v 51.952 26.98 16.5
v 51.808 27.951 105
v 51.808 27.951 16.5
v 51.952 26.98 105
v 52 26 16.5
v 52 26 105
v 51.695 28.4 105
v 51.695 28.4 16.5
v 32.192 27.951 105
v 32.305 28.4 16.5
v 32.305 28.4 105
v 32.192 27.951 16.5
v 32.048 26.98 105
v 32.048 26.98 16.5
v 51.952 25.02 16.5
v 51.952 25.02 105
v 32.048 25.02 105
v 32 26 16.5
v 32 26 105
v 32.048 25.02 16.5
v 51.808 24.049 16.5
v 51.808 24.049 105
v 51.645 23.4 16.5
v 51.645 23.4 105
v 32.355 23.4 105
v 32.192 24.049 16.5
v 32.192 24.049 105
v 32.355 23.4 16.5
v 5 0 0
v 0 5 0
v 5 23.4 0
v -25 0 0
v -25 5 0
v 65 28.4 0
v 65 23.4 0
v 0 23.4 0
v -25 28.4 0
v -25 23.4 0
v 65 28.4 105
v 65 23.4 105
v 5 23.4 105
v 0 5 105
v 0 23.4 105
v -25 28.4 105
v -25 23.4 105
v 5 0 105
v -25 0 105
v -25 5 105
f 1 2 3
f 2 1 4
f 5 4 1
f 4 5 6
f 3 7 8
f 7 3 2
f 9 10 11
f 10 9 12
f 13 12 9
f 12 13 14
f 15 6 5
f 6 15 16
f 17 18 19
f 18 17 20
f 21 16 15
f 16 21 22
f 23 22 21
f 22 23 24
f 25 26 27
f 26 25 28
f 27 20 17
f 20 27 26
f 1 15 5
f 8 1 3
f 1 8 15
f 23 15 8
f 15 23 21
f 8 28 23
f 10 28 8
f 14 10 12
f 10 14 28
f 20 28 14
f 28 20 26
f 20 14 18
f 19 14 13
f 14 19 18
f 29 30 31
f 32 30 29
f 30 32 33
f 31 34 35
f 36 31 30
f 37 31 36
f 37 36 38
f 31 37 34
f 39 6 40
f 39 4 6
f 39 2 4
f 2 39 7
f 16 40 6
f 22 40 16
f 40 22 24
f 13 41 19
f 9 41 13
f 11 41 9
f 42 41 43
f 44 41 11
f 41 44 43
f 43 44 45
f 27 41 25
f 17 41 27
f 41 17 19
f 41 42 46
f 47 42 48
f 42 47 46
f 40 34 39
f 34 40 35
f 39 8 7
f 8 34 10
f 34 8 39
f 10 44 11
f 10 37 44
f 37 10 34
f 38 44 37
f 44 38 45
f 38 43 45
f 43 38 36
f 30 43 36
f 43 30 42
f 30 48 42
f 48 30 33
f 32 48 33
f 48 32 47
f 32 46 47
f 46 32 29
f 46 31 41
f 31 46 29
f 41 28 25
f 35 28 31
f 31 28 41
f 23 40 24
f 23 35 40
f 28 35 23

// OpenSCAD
// ---------------------------------------------------------------------------
// 3-pipette shelf clamp, printed on its side.
// Print orientation: 2-D profile in XY, extruded 105 mm along Z.
// In use: +Y is up, +X points away from the shelf, Z is the 105 mm length.
// ---------------------------------------------------------------------------

// --- named dimensions (mm) ---
shelf_t      = 18;    // shelf thickness the clamp grips
gap          = 18.4;  // vertical gap left for the shelf (bottom jaw top -> top jaw bottom)
spine_x0     = 0;     // spine starts at x = 0
spine_x1     = 5;     // spine ends at x = 5
spine_y0     = 0;     // spine bottom edge (shelf face)
spine_y1     = 28.4;  // spine top edge
bot_x0       = -25;   // bottom jaw starts at x = -25
bot_x1       = 5;     // bottom jaw ends at x = 5
bot_y0       = 0;     // bottom jaw bottom edge
bot_y1       = 5;     // bottom jaw top edge
top_x0       = -25;   // top jaw / arm starts at x = -25
top_x1       = 65;    // top jaw / arm ends at x = 65
top_y0       = 23.4;  // top jaw bottom edge (23.4 = 5 + 18.4)
top_y1       = 28.4;  // top jaw top edge
extrude_len  = 105;   // length of the part along Z (the 3 pipettes hang along this)
hole_d       = 20;    // pipette bore diameter
hole_x       = 42;    // bore centre x (in the arm)
hole_z       = [17.5, 52.5, 87.5]; // bore centre z positions

$fn = 64;

// --- 2-D C-shaped profile in the XY plane (union of the three rectangles) ---
module profile() { union() {
    // spine: x 0..5, y 0..28.4
    translate([spine_x0, spine_y0])
        square([spine_x1 - spine_x0, spine_y1 - spine_y0]);
    // bottom jaw: x -25..5, y 0..5
    translate([bot_x0, bot_y0])
        square([bot_x1 - bot_x0, bot_y1 - bot_y0]);
    // top jaw + forward arm: x -25..65, y 23.4..28.4
    translate([top_x0, top_y0])
        square([top_x1 - top_x0, top_y1 - top_y0]);
} }

// --- extrude the profile 105 mm along Z, then drill the 3 pipette bores ---
module part() {
    difference() {
        linear_extrude(height = extrude_len)
            profile();

        for (z = hole_z) {
            // bore axis is along Z (vertical in use); centred at x = 42, y = 26
            translate([hole_x, 26, z - 1])
                cylinder(h = extrude_len + 2, r = hole_d / 2, $fn = 64);
        }
    }
}

part();
